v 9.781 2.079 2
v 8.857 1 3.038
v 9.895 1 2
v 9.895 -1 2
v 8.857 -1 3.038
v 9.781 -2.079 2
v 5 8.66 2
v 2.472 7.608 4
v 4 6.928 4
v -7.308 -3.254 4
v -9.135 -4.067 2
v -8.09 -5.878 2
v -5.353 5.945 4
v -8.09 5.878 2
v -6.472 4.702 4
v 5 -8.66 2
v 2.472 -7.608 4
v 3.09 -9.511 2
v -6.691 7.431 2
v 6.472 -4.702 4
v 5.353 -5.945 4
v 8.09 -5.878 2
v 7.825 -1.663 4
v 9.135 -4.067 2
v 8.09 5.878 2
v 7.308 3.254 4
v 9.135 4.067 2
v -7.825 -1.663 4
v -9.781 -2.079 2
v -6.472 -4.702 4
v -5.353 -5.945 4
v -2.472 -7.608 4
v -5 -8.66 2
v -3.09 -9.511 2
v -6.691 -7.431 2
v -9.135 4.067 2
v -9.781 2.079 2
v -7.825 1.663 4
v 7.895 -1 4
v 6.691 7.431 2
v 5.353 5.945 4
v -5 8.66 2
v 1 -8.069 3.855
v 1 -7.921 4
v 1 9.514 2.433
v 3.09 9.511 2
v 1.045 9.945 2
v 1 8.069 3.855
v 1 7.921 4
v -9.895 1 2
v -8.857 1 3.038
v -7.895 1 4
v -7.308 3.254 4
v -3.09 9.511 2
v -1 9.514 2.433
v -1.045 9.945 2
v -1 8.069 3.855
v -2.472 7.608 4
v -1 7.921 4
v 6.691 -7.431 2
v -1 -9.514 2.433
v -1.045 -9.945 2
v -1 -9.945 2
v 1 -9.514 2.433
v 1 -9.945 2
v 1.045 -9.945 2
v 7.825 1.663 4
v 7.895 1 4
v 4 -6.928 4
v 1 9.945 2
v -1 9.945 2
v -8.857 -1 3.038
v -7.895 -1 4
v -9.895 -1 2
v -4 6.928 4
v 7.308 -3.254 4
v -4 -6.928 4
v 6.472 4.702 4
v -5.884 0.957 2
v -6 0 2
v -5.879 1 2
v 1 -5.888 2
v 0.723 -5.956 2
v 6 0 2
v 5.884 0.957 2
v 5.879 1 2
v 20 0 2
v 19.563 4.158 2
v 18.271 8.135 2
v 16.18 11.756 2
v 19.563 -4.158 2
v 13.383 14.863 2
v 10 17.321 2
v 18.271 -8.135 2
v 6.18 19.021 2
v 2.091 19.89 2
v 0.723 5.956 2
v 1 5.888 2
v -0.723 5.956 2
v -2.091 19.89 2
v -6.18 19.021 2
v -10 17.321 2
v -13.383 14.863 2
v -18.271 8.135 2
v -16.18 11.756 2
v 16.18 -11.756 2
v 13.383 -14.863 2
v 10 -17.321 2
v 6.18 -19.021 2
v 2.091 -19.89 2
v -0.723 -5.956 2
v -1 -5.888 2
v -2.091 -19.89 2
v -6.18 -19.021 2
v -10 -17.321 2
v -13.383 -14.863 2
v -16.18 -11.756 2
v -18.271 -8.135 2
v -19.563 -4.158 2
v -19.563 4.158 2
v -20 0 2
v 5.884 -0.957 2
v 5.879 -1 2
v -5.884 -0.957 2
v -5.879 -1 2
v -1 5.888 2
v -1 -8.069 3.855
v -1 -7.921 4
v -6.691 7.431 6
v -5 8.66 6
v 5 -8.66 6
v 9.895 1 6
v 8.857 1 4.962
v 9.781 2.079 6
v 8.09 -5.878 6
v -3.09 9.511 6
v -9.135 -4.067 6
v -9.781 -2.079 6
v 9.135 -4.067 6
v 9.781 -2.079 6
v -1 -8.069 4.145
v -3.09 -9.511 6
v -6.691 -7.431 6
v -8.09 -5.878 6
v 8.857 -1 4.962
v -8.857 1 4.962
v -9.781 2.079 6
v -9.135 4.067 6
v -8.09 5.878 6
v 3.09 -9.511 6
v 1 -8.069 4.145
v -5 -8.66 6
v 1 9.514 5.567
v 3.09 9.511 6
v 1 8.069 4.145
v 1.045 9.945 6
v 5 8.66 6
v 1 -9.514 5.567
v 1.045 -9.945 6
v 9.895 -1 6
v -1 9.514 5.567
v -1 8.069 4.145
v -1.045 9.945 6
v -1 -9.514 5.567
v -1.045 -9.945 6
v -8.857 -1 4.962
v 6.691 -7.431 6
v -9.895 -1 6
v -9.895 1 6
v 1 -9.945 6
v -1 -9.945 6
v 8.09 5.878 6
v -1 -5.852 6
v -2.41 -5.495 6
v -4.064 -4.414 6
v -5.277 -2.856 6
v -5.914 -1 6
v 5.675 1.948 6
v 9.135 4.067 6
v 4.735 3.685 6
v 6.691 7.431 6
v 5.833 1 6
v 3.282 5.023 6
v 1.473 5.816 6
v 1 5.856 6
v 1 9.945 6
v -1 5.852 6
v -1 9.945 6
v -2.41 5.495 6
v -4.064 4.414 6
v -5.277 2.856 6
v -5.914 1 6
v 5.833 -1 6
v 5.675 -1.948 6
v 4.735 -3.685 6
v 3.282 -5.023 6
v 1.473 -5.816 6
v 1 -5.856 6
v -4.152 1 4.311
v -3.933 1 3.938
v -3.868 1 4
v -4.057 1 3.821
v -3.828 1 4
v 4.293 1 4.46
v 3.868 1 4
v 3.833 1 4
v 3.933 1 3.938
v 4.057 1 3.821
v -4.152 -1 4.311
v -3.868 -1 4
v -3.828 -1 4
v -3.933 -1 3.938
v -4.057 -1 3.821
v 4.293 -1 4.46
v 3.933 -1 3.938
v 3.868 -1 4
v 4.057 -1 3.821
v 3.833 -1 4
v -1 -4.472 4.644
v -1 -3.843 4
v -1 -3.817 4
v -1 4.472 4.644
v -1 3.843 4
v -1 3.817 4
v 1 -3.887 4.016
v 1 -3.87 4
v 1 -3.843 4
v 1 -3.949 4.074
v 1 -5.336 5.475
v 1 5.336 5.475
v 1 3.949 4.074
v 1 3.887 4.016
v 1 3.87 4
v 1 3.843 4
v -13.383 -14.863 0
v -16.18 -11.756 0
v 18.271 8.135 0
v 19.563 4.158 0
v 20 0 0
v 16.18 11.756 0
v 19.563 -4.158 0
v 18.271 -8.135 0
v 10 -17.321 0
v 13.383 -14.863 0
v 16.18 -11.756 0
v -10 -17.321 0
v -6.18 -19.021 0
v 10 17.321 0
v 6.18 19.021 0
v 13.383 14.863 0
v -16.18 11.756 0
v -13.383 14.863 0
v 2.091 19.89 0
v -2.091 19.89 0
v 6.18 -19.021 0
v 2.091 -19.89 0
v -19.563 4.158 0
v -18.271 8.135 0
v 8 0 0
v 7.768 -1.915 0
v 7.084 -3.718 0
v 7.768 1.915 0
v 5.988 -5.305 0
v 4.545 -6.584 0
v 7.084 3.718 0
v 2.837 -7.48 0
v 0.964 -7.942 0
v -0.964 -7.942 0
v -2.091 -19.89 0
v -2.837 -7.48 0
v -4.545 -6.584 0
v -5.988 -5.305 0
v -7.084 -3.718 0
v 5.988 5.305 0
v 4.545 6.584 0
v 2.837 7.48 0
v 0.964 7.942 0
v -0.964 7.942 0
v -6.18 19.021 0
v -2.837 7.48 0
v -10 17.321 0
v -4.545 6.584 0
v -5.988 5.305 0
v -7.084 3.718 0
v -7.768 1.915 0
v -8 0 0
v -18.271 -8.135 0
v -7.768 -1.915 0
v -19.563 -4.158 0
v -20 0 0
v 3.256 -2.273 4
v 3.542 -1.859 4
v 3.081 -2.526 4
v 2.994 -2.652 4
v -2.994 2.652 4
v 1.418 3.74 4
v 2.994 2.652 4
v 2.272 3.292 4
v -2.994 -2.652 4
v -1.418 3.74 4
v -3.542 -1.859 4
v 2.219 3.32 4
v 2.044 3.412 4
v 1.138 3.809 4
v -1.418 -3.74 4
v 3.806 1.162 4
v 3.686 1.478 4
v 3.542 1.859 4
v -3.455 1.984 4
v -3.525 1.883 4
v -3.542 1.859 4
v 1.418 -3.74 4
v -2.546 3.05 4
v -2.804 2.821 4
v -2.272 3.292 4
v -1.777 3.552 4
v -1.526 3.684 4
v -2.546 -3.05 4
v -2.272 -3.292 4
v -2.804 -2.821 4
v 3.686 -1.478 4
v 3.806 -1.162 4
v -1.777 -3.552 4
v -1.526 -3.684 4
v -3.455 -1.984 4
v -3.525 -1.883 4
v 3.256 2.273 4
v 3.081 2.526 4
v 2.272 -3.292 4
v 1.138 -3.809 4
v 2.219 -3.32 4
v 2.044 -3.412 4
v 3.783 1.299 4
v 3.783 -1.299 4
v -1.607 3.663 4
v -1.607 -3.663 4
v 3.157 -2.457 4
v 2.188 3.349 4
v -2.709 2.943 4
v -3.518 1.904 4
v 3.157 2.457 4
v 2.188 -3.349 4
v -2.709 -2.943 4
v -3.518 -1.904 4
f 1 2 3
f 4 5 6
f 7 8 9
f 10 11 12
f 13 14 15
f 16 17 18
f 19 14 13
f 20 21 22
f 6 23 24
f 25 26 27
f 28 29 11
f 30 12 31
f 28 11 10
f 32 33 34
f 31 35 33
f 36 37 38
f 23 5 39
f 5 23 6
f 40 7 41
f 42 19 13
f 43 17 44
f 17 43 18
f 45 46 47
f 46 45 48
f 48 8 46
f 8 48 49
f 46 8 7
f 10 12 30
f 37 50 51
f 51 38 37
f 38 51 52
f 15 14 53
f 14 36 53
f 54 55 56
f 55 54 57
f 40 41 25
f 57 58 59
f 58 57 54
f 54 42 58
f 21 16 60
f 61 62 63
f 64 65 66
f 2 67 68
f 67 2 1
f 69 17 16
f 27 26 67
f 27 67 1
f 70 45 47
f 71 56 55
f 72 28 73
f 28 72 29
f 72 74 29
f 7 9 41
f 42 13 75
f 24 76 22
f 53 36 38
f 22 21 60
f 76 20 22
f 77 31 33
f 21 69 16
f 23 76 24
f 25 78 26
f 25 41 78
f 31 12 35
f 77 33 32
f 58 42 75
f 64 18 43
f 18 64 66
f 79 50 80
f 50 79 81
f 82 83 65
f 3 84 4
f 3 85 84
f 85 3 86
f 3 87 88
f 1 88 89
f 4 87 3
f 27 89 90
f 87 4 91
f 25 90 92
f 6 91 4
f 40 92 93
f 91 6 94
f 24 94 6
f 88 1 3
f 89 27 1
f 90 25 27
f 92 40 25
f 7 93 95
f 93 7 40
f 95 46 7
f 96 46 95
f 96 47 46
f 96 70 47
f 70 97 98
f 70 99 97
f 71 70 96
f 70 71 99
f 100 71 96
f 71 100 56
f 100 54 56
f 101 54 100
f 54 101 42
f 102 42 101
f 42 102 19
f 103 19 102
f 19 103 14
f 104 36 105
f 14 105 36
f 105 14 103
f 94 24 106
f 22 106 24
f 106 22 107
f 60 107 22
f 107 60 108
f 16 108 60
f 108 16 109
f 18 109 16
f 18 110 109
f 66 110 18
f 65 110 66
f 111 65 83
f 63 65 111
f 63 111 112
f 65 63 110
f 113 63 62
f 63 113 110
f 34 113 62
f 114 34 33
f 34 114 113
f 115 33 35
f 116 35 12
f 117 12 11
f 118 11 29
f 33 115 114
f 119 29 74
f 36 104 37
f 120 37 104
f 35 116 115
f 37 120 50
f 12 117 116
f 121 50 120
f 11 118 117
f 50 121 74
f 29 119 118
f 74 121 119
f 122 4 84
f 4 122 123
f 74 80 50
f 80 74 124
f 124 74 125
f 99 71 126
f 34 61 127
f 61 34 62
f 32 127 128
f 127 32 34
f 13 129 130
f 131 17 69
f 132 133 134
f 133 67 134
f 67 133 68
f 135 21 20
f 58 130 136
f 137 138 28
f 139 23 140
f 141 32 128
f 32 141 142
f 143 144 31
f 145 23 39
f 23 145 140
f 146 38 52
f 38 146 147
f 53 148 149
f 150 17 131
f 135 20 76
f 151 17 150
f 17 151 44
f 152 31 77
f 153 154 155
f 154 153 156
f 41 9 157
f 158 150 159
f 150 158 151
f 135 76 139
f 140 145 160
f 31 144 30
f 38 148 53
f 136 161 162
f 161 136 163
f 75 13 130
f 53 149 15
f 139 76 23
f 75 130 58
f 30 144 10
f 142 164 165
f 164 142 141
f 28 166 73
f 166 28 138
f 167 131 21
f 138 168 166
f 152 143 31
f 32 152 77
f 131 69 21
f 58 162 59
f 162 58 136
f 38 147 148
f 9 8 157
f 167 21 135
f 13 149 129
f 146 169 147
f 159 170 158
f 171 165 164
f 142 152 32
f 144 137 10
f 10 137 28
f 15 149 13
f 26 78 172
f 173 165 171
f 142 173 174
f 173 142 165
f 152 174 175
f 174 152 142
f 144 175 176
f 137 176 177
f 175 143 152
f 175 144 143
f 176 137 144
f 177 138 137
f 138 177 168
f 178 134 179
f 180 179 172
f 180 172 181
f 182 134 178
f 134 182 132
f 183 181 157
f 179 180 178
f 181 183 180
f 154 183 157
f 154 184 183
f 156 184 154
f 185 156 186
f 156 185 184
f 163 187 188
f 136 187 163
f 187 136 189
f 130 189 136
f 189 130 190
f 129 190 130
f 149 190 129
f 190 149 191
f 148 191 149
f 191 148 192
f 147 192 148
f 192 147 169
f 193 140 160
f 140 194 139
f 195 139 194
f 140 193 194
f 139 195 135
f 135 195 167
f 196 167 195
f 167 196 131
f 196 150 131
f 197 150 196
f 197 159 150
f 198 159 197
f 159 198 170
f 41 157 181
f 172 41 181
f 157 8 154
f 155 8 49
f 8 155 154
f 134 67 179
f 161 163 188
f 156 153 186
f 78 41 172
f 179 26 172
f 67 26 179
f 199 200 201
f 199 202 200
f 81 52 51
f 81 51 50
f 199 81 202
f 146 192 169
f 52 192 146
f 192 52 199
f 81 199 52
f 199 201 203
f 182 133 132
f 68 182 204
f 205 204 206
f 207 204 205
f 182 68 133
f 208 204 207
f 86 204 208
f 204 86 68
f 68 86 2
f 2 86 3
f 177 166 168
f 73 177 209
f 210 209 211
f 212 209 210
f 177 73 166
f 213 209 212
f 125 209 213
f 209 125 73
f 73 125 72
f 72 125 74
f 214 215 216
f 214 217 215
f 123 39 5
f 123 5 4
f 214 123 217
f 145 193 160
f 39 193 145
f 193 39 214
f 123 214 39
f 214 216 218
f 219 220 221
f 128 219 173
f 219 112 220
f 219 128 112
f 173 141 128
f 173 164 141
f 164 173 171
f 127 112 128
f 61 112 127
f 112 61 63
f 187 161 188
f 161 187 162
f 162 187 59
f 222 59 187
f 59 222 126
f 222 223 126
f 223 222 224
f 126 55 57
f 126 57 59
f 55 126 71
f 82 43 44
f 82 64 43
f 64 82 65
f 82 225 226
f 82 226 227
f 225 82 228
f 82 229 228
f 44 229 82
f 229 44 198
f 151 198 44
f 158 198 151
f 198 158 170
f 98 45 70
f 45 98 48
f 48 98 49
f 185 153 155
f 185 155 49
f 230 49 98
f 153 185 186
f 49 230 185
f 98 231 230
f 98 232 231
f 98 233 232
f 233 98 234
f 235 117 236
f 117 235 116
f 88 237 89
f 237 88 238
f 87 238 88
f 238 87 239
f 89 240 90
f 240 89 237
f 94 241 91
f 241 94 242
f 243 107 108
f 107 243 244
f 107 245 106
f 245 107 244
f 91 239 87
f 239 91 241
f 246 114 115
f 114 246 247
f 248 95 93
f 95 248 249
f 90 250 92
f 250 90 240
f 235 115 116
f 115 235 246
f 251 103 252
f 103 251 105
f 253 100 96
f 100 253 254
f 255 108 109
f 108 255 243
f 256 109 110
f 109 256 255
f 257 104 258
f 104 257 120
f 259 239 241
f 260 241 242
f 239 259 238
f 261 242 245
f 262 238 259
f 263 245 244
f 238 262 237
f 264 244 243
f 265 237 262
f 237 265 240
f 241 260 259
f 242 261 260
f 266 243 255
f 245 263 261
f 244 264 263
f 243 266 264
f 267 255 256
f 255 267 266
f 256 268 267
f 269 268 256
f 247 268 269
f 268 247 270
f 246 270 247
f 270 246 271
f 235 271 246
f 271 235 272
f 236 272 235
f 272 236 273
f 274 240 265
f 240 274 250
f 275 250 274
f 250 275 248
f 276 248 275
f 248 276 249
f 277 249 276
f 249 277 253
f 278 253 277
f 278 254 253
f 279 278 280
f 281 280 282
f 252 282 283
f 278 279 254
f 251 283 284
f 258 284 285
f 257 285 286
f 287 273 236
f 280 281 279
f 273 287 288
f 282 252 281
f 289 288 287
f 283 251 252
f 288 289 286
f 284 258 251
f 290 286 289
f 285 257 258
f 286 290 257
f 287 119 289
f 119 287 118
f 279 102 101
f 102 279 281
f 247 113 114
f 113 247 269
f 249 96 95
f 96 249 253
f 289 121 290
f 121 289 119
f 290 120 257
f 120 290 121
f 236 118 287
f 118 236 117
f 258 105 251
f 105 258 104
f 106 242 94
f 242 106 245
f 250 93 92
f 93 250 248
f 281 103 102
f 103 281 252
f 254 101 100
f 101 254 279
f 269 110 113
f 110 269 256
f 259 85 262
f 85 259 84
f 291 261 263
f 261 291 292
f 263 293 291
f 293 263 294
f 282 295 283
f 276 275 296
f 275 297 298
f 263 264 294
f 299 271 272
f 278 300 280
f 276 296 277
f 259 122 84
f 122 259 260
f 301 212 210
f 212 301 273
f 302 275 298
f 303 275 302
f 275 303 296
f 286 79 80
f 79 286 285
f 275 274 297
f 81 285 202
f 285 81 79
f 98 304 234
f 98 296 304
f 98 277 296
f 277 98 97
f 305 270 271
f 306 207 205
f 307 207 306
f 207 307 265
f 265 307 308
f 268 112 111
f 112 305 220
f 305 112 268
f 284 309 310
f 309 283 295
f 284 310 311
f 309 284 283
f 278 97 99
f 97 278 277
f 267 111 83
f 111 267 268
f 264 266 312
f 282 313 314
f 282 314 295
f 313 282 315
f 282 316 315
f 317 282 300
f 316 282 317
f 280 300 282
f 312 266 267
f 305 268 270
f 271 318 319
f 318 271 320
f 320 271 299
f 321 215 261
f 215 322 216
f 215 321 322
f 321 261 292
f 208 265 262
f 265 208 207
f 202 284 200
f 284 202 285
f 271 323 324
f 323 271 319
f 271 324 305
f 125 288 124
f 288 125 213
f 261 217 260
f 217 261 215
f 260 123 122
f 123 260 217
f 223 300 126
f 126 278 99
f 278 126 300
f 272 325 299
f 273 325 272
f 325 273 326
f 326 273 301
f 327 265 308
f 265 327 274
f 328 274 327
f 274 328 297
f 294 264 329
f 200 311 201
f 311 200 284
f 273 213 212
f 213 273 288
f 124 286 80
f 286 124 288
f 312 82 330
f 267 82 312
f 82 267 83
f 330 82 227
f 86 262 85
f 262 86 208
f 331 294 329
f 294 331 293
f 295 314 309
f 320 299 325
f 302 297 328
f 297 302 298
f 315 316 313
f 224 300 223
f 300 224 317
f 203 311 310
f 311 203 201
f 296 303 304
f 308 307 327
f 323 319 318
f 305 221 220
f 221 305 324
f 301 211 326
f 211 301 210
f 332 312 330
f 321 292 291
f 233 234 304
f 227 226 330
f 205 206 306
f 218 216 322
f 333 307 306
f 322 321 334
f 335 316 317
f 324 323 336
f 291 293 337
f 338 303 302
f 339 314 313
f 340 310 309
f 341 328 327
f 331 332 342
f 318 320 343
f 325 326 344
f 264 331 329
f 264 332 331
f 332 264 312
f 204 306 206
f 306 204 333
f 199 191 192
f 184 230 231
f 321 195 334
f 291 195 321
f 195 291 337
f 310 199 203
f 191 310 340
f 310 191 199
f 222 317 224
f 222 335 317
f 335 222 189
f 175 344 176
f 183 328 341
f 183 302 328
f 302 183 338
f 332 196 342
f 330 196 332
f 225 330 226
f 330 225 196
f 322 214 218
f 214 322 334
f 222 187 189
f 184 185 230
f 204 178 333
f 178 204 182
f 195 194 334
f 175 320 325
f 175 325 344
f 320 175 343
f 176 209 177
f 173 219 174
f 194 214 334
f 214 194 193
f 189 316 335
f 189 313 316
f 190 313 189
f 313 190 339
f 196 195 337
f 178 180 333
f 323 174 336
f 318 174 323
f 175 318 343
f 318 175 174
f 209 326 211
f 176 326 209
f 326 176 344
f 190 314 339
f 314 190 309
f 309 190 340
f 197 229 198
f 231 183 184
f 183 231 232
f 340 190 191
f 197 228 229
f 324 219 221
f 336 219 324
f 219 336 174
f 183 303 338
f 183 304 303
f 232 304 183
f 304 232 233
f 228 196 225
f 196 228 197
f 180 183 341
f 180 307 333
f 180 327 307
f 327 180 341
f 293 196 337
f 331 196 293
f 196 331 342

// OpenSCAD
// import("Pliers_Left.STL");

// translate([0,0,-30])
// import("Pliers_Right.STL");

difference()
{
	union()
	{
		translate([0,0,0])
			cylinder(r=20,h=2);
		difference()
		{
			union()
			{
				translate([0,0,2])
					cylinder(r1=10,r2=8,h=2);
				translate([0,0,4])
					cylinder(r1=8,r2=10,h=2);
			}
			translate([0,0,2+5])
			{
				cube([50,2,10],center=true);
				rotate([0,0,90])
					cube([50,2,10],center=true);
			}
		}
	}
	translate([0,0,0])
		cylinder(r1=8,r2=4,h=4);
	translate([0,0,4])
		cylinder(r1=4,r2=6,h=2);
}
